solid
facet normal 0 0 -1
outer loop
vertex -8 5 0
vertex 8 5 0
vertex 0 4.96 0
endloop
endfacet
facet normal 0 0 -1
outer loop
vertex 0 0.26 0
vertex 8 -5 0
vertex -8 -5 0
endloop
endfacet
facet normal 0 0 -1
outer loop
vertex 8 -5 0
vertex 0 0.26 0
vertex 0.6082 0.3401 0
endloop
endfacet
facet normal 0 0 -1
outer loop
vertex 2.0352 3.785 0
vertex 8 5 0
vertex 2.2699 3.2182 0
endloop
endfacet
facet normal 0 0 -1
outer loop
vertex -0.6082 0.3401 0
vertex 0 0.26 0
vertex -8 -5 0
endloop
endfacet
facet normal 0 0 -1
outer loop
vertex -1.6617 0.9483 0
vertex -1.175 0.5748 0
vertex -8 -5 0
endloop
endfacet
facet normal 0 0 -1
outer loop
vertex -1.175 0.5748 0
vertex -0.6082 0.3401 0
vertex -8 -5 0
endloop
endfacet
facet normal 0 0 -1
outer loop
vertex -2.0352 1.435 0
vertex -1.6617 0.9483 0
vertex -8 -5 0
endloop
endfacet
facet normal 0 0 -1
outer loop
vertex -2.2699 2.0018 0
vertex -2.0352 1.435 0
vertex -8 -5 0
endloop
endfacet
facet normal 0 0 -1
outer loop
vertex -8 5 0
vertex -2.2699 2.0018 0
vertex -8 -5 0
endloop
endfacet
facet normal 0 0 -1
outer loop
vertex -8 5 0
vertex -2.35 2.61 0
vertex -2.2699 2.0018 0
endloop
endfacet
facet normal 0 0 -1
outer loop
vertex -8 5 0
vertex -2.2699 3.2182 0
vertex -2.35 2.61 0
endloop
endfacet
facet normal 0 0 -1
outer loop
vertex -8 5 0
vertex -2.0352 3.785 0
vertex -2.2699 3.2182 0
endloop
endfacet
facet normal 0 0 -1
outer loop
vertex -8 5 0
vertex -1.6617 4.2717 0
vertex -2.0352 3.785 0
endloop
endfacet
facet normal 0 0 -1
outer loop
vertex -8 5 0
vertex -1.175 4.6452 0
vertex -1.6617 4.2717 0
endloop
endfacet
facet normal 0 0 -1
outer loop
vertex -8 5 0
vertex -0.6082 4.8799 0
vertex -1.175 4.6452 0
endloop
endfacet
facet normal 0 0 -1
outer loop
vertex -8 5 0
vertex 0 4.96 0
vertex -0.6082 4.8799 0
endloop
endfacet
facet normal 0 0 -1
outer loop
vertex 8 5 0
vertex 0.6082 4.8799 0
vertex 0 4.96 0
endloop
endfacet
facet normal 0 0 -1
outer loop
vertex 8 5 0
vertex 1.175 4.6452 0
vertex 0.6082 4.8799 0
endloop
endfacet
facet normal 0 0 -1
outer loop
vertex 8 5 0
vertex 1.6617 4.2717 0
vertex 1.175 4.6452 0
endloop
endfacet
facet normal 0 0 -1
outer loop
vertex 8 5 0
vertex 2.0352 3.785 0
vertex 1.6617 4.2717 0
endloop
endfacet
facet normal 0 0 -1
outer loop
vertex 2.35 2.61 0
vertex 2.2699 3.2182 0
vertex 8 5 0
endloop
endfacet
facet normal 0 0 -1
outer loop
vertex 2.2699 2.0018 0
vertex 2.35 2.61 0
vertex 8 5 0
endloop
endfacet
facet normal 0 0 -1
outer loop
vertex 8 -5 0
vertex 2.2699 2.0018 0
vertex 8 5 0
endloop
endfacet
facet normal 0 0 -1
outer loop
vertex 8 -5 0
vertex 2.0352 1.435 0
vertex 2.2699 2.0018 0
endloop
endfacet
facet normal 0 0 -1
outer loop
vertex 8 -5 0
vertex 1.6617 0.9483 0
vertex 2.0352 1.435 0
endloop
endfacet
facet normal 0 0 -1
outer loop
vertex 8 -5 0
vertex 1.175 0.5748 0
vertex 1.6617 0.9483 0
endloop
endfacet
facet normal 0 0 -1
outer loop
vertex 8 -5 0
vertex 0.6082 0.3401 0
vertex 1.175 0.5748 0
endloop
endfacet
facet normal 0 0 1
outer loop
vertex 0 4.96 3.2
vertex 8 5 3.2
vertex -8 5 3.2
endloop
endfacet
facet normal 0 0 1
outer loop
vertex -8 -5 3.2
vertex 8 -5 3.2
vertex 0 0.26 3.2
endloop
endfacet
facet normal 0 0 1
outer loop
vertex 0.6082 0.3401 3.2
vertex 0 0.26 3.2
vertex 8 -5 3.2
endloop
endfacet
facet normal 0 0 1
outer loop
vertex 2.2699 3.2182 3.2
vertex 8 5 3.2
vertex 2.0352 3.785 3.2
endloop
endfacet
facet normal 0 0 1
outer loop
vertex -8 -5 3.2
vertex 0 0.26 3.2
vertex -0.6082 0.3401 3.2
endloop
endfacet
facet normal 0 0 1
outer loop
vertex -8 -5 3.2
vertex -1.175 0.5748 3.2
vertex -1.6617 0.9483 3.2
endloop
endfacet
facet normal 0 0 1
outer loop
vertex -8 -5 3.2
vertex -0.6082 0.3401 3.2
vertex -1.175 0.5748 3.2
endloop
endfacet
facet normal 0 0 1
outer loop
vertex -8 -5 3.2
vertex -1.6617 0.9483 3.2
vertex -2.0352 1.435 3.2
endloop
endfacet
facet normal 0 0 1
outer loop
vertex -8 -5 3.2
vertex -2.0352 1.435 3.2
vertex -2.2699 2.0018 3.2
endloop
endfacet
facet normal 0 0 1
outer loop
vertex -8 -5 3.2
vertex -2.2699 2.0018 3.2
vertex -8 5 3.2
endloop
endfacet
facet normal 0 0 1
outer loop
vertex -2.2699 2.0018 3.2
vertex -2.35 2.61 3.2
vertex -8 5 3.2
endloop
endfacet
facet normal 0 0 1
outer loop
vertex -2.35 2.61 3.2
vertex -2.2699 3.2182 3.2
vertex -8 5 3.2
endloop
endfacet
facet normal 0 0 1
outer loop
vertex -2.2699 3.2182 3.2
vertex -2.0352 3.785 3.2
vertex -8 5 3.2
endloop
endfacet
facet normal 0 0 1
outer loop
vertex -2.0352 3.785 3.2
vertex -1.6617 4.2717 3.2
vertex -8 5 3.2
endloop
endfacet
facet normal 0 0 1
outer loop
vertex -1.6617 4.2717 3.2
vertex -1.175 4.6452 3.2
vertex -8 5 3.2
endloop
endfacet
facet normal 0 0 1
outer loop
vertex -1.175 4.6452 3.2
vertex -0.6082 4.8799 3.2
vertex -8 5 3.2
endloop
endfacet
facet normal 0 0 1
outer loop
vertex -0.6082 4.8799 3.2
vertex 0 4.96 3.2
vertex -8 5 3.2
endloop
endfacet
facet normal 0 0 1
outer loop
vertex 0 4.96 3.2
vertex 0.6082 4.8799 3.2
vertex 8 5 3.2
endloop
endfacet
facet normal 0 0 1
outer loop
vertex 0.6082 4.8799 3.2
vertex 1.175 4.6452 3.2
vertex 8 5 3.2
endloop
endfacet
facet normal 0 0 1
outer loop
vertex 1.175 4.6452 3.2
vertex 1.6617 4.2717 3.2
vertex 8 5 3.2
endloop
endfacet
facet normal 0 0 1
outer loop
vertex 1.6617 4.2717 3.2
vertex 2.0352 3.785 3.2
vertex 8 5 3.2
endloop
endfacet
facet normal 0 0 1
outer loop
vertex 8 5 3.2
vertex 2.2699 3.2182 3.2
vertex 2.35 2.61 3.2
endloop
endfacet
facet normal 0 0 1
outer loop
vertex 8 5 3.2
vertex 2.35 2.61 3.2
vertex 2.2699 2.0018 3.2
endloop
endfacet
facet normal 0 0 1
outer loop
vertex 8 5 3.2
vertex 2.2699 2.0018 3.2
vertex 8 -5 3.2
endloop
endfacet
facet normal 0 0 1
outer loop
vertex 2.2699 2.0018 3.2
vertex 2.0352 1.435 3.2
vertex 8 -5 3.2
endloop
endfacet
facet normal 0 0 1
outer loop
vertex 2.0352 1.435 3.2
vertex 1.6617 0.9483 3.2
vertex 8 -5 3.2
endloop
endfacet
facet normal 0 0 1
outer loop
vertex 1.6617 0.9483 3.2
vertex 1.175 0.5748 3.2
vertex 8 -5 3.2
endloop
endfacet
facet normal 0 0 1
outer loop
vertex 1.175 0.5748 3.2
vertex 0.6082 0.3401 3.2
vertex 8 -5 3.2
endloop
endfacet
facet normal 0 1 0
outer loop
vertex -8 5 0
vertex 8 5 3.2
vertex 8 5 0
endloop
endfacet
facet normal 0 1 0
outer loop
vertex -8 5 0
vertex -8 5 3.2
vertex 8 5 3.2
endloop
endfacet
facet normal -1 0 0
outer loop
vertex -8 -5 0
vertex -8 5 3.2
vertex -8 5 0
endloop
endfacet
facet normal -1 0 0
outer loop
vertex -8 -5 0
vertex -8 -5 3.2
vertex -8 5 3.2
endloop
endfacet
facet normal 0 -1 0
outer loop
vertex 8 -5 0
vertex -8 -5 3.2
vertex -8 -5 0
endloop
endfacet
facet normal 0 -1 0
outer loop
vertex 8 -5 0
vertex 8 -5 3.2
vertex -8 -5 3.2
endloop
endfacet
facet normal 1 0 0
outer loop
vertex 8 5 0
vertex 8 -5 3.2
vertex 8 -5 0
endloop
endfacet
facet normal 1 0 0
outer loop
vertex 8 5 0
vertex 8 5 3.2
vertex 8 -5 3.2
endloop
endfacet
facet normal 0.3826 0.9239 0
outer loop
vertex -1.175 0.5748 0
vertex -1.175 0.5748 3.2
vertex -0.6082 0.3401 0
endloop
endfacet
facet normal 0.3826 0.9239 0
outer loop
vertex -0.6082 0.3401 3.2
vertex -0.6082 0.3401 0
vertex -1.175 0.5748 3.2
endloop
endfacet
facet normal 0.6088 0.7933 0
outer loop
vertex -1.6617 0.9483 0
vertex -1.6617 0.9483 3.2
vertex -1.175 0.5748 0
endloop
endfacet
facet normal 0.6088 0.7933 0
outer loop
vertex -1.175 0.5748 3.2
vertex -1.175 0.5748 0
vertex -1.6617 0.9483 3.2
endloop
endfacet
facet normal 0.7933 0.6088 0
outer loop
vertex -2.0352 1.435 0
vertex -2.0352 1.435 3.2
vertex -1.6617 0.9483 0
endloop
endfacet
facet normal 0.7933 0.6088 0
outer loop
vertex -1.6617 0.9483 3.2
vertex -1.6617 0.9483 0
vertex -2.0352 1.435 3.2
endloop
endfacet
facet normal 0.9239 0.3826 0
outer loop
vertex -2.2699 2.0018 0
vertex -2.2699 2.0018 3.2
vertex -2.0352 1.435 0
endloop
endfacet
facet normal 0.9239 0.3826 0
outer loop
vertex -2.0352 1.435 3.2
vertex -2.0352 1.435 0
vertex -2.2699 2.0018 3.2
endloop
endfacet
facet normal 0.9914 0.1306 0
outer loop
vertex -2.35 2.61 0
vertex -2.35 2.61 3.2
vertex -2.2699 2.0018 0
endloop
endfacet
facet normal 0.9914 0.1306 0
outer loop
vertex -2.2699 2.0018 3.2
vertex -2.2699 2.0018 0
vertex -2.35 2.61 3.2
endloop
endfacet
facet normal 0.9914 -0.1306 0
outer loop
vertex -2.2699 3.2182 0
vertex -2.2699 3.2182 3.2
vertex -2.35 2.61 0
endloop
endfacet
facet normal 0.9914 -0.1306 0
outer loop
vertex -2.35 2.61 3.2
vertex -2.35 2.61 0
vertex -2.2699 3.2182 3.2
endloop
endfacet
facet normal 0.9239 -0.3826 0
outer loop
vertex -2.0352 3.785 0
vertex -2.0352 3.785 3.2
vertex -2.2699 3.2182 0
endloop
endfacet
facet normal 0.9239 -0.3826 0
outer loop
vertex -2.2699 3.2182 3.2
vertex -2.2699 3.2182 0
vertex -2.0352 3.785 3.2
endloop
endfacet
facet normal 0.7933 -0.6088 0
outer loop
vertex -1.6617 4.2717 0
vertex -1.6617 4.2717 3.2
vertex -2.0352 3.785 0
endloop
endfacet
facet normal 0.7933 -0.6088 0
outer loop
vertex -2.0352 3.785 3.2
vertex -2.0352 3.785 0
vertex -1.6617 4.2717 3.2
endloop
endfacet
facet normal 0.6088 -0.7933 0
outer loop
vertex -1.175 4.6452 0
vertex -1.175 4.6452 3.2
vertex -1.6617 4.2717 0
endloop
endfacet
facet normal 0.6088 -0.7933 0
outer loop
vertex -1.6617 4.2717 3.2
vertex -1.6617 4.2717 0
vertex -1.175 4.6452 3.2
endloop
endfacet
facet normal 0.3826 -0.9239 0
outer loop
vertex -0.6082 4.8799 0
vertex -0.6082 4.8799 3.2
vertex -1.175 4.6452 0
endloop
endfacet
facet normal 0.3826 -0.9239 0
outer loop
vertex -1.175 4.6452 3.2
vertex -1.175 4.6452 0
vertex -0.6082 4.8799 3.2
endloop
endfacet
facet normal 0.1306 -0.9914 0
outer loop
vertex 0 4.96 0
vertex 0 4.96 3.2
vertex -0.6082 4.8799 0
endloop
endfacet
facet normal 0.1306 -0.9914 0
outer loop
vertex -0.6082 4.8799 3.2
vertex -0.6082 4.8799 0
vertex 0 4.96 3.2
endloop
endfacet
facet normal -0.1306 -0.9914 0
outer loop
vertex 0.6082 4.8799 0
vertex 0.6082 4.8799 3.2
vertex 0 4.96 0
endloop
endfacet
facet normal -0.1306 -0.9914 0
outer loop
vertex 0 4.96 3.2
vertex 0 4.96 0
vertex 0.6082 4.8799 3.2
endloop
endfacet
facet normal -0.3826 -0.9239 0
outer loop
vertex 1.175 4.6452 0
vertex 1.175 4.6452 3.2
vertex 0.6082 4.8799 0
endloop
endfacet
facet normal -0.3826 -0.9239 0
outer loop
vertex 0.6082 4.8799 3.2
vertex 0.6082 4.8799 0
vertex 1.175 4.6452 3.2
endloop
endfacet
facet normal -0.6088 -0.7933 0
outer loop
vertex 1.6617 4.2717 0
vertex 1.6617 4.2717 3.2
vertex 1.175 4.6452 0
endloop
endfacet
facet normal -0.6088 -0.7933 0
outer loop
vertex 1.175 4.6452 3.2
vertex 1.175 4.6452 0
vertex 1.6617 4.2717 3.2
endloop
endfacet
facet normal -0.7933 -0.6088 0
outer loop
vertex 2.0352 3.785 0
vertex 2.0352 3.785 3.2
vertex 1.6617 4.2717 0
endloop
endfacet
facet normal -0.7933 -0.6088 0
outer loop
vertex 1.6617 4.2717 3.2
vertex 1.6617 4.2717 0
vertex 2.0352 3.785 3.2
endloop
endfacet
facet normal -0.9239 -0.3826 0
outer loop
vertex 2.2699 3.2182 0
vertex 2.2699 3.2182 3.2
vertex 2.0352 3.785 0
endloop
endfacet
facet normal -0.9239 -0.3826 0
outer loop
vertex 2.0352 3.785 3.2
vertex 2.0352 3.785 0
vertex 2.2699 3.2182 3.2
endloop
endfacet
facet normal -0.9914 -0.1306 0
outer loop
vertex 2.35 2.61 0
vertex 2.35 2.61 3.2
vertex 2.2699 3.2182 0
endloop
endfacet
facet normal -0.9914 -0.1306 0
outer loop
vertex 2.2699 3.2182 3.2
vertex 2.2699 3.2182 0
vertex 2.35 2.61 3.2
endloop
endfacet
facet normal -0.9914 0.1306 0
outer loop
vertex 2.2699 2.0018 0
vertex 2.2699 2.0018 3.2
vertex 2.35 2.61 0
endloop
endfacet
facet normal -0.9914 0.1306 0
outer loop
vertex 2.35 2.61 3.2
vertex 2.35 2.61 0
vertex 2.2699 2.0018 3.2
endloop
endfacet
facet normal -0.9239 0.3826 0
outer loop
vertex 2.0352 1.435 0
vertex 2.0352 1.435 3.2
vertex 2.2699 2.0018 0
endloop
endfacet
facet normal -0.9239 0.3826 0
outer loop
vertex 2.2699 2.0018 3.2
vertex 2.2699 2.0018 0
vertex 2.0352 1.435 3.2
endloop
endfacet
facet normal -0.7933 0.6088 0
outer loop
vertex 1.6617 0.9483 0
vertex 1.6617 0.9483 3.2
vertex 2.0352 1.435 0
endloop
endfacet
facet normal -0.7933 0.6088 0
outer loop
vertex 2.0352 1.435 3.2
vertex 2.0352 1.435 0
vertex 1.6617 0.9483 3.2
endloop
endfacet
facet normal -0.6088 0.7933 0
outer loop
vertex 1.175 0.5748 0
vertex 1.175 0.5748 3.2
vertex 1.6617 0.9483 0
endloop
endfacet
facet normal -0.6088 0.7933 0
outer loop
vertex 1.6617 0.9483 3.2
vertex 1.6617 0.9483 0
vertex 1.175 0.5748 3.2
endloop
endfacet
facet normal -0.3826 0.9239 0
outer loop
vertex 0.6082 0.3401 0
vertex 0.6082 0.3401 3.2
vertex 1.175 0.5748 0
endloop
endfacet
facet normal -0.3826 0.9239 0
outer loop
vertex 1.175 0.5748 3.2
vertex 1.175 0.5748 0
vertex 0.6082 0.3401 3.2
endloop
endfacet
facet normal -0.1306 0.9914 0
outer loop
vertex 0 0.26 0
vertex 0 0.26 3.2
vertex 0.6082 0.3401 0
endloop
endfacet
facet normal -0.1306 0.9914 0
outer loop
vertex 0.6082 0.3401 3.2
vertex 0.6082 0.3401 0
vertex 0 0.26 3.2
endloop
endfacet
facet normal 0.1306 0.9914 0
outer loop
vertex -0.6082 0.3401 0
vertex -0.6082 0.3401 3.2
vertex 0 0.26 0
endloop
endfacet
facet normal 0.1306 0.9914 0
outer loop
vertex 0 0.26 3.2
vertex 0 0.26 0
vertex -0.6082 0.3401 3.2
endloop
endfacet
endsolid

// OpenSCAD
thickness = 1/8 * 25.6; //mm
width = 16; //mm
height = 10; //mm
hole_diameter = 4.7; //mm
hole_offset = 2.61; //mm
$fn=24;

linear_extrude(thickness) {
  difference() {
    square([width, height], center = true);
    translate([0, hole_offset]) {
      circle(d=hole_diameter);
    }
  }
}
